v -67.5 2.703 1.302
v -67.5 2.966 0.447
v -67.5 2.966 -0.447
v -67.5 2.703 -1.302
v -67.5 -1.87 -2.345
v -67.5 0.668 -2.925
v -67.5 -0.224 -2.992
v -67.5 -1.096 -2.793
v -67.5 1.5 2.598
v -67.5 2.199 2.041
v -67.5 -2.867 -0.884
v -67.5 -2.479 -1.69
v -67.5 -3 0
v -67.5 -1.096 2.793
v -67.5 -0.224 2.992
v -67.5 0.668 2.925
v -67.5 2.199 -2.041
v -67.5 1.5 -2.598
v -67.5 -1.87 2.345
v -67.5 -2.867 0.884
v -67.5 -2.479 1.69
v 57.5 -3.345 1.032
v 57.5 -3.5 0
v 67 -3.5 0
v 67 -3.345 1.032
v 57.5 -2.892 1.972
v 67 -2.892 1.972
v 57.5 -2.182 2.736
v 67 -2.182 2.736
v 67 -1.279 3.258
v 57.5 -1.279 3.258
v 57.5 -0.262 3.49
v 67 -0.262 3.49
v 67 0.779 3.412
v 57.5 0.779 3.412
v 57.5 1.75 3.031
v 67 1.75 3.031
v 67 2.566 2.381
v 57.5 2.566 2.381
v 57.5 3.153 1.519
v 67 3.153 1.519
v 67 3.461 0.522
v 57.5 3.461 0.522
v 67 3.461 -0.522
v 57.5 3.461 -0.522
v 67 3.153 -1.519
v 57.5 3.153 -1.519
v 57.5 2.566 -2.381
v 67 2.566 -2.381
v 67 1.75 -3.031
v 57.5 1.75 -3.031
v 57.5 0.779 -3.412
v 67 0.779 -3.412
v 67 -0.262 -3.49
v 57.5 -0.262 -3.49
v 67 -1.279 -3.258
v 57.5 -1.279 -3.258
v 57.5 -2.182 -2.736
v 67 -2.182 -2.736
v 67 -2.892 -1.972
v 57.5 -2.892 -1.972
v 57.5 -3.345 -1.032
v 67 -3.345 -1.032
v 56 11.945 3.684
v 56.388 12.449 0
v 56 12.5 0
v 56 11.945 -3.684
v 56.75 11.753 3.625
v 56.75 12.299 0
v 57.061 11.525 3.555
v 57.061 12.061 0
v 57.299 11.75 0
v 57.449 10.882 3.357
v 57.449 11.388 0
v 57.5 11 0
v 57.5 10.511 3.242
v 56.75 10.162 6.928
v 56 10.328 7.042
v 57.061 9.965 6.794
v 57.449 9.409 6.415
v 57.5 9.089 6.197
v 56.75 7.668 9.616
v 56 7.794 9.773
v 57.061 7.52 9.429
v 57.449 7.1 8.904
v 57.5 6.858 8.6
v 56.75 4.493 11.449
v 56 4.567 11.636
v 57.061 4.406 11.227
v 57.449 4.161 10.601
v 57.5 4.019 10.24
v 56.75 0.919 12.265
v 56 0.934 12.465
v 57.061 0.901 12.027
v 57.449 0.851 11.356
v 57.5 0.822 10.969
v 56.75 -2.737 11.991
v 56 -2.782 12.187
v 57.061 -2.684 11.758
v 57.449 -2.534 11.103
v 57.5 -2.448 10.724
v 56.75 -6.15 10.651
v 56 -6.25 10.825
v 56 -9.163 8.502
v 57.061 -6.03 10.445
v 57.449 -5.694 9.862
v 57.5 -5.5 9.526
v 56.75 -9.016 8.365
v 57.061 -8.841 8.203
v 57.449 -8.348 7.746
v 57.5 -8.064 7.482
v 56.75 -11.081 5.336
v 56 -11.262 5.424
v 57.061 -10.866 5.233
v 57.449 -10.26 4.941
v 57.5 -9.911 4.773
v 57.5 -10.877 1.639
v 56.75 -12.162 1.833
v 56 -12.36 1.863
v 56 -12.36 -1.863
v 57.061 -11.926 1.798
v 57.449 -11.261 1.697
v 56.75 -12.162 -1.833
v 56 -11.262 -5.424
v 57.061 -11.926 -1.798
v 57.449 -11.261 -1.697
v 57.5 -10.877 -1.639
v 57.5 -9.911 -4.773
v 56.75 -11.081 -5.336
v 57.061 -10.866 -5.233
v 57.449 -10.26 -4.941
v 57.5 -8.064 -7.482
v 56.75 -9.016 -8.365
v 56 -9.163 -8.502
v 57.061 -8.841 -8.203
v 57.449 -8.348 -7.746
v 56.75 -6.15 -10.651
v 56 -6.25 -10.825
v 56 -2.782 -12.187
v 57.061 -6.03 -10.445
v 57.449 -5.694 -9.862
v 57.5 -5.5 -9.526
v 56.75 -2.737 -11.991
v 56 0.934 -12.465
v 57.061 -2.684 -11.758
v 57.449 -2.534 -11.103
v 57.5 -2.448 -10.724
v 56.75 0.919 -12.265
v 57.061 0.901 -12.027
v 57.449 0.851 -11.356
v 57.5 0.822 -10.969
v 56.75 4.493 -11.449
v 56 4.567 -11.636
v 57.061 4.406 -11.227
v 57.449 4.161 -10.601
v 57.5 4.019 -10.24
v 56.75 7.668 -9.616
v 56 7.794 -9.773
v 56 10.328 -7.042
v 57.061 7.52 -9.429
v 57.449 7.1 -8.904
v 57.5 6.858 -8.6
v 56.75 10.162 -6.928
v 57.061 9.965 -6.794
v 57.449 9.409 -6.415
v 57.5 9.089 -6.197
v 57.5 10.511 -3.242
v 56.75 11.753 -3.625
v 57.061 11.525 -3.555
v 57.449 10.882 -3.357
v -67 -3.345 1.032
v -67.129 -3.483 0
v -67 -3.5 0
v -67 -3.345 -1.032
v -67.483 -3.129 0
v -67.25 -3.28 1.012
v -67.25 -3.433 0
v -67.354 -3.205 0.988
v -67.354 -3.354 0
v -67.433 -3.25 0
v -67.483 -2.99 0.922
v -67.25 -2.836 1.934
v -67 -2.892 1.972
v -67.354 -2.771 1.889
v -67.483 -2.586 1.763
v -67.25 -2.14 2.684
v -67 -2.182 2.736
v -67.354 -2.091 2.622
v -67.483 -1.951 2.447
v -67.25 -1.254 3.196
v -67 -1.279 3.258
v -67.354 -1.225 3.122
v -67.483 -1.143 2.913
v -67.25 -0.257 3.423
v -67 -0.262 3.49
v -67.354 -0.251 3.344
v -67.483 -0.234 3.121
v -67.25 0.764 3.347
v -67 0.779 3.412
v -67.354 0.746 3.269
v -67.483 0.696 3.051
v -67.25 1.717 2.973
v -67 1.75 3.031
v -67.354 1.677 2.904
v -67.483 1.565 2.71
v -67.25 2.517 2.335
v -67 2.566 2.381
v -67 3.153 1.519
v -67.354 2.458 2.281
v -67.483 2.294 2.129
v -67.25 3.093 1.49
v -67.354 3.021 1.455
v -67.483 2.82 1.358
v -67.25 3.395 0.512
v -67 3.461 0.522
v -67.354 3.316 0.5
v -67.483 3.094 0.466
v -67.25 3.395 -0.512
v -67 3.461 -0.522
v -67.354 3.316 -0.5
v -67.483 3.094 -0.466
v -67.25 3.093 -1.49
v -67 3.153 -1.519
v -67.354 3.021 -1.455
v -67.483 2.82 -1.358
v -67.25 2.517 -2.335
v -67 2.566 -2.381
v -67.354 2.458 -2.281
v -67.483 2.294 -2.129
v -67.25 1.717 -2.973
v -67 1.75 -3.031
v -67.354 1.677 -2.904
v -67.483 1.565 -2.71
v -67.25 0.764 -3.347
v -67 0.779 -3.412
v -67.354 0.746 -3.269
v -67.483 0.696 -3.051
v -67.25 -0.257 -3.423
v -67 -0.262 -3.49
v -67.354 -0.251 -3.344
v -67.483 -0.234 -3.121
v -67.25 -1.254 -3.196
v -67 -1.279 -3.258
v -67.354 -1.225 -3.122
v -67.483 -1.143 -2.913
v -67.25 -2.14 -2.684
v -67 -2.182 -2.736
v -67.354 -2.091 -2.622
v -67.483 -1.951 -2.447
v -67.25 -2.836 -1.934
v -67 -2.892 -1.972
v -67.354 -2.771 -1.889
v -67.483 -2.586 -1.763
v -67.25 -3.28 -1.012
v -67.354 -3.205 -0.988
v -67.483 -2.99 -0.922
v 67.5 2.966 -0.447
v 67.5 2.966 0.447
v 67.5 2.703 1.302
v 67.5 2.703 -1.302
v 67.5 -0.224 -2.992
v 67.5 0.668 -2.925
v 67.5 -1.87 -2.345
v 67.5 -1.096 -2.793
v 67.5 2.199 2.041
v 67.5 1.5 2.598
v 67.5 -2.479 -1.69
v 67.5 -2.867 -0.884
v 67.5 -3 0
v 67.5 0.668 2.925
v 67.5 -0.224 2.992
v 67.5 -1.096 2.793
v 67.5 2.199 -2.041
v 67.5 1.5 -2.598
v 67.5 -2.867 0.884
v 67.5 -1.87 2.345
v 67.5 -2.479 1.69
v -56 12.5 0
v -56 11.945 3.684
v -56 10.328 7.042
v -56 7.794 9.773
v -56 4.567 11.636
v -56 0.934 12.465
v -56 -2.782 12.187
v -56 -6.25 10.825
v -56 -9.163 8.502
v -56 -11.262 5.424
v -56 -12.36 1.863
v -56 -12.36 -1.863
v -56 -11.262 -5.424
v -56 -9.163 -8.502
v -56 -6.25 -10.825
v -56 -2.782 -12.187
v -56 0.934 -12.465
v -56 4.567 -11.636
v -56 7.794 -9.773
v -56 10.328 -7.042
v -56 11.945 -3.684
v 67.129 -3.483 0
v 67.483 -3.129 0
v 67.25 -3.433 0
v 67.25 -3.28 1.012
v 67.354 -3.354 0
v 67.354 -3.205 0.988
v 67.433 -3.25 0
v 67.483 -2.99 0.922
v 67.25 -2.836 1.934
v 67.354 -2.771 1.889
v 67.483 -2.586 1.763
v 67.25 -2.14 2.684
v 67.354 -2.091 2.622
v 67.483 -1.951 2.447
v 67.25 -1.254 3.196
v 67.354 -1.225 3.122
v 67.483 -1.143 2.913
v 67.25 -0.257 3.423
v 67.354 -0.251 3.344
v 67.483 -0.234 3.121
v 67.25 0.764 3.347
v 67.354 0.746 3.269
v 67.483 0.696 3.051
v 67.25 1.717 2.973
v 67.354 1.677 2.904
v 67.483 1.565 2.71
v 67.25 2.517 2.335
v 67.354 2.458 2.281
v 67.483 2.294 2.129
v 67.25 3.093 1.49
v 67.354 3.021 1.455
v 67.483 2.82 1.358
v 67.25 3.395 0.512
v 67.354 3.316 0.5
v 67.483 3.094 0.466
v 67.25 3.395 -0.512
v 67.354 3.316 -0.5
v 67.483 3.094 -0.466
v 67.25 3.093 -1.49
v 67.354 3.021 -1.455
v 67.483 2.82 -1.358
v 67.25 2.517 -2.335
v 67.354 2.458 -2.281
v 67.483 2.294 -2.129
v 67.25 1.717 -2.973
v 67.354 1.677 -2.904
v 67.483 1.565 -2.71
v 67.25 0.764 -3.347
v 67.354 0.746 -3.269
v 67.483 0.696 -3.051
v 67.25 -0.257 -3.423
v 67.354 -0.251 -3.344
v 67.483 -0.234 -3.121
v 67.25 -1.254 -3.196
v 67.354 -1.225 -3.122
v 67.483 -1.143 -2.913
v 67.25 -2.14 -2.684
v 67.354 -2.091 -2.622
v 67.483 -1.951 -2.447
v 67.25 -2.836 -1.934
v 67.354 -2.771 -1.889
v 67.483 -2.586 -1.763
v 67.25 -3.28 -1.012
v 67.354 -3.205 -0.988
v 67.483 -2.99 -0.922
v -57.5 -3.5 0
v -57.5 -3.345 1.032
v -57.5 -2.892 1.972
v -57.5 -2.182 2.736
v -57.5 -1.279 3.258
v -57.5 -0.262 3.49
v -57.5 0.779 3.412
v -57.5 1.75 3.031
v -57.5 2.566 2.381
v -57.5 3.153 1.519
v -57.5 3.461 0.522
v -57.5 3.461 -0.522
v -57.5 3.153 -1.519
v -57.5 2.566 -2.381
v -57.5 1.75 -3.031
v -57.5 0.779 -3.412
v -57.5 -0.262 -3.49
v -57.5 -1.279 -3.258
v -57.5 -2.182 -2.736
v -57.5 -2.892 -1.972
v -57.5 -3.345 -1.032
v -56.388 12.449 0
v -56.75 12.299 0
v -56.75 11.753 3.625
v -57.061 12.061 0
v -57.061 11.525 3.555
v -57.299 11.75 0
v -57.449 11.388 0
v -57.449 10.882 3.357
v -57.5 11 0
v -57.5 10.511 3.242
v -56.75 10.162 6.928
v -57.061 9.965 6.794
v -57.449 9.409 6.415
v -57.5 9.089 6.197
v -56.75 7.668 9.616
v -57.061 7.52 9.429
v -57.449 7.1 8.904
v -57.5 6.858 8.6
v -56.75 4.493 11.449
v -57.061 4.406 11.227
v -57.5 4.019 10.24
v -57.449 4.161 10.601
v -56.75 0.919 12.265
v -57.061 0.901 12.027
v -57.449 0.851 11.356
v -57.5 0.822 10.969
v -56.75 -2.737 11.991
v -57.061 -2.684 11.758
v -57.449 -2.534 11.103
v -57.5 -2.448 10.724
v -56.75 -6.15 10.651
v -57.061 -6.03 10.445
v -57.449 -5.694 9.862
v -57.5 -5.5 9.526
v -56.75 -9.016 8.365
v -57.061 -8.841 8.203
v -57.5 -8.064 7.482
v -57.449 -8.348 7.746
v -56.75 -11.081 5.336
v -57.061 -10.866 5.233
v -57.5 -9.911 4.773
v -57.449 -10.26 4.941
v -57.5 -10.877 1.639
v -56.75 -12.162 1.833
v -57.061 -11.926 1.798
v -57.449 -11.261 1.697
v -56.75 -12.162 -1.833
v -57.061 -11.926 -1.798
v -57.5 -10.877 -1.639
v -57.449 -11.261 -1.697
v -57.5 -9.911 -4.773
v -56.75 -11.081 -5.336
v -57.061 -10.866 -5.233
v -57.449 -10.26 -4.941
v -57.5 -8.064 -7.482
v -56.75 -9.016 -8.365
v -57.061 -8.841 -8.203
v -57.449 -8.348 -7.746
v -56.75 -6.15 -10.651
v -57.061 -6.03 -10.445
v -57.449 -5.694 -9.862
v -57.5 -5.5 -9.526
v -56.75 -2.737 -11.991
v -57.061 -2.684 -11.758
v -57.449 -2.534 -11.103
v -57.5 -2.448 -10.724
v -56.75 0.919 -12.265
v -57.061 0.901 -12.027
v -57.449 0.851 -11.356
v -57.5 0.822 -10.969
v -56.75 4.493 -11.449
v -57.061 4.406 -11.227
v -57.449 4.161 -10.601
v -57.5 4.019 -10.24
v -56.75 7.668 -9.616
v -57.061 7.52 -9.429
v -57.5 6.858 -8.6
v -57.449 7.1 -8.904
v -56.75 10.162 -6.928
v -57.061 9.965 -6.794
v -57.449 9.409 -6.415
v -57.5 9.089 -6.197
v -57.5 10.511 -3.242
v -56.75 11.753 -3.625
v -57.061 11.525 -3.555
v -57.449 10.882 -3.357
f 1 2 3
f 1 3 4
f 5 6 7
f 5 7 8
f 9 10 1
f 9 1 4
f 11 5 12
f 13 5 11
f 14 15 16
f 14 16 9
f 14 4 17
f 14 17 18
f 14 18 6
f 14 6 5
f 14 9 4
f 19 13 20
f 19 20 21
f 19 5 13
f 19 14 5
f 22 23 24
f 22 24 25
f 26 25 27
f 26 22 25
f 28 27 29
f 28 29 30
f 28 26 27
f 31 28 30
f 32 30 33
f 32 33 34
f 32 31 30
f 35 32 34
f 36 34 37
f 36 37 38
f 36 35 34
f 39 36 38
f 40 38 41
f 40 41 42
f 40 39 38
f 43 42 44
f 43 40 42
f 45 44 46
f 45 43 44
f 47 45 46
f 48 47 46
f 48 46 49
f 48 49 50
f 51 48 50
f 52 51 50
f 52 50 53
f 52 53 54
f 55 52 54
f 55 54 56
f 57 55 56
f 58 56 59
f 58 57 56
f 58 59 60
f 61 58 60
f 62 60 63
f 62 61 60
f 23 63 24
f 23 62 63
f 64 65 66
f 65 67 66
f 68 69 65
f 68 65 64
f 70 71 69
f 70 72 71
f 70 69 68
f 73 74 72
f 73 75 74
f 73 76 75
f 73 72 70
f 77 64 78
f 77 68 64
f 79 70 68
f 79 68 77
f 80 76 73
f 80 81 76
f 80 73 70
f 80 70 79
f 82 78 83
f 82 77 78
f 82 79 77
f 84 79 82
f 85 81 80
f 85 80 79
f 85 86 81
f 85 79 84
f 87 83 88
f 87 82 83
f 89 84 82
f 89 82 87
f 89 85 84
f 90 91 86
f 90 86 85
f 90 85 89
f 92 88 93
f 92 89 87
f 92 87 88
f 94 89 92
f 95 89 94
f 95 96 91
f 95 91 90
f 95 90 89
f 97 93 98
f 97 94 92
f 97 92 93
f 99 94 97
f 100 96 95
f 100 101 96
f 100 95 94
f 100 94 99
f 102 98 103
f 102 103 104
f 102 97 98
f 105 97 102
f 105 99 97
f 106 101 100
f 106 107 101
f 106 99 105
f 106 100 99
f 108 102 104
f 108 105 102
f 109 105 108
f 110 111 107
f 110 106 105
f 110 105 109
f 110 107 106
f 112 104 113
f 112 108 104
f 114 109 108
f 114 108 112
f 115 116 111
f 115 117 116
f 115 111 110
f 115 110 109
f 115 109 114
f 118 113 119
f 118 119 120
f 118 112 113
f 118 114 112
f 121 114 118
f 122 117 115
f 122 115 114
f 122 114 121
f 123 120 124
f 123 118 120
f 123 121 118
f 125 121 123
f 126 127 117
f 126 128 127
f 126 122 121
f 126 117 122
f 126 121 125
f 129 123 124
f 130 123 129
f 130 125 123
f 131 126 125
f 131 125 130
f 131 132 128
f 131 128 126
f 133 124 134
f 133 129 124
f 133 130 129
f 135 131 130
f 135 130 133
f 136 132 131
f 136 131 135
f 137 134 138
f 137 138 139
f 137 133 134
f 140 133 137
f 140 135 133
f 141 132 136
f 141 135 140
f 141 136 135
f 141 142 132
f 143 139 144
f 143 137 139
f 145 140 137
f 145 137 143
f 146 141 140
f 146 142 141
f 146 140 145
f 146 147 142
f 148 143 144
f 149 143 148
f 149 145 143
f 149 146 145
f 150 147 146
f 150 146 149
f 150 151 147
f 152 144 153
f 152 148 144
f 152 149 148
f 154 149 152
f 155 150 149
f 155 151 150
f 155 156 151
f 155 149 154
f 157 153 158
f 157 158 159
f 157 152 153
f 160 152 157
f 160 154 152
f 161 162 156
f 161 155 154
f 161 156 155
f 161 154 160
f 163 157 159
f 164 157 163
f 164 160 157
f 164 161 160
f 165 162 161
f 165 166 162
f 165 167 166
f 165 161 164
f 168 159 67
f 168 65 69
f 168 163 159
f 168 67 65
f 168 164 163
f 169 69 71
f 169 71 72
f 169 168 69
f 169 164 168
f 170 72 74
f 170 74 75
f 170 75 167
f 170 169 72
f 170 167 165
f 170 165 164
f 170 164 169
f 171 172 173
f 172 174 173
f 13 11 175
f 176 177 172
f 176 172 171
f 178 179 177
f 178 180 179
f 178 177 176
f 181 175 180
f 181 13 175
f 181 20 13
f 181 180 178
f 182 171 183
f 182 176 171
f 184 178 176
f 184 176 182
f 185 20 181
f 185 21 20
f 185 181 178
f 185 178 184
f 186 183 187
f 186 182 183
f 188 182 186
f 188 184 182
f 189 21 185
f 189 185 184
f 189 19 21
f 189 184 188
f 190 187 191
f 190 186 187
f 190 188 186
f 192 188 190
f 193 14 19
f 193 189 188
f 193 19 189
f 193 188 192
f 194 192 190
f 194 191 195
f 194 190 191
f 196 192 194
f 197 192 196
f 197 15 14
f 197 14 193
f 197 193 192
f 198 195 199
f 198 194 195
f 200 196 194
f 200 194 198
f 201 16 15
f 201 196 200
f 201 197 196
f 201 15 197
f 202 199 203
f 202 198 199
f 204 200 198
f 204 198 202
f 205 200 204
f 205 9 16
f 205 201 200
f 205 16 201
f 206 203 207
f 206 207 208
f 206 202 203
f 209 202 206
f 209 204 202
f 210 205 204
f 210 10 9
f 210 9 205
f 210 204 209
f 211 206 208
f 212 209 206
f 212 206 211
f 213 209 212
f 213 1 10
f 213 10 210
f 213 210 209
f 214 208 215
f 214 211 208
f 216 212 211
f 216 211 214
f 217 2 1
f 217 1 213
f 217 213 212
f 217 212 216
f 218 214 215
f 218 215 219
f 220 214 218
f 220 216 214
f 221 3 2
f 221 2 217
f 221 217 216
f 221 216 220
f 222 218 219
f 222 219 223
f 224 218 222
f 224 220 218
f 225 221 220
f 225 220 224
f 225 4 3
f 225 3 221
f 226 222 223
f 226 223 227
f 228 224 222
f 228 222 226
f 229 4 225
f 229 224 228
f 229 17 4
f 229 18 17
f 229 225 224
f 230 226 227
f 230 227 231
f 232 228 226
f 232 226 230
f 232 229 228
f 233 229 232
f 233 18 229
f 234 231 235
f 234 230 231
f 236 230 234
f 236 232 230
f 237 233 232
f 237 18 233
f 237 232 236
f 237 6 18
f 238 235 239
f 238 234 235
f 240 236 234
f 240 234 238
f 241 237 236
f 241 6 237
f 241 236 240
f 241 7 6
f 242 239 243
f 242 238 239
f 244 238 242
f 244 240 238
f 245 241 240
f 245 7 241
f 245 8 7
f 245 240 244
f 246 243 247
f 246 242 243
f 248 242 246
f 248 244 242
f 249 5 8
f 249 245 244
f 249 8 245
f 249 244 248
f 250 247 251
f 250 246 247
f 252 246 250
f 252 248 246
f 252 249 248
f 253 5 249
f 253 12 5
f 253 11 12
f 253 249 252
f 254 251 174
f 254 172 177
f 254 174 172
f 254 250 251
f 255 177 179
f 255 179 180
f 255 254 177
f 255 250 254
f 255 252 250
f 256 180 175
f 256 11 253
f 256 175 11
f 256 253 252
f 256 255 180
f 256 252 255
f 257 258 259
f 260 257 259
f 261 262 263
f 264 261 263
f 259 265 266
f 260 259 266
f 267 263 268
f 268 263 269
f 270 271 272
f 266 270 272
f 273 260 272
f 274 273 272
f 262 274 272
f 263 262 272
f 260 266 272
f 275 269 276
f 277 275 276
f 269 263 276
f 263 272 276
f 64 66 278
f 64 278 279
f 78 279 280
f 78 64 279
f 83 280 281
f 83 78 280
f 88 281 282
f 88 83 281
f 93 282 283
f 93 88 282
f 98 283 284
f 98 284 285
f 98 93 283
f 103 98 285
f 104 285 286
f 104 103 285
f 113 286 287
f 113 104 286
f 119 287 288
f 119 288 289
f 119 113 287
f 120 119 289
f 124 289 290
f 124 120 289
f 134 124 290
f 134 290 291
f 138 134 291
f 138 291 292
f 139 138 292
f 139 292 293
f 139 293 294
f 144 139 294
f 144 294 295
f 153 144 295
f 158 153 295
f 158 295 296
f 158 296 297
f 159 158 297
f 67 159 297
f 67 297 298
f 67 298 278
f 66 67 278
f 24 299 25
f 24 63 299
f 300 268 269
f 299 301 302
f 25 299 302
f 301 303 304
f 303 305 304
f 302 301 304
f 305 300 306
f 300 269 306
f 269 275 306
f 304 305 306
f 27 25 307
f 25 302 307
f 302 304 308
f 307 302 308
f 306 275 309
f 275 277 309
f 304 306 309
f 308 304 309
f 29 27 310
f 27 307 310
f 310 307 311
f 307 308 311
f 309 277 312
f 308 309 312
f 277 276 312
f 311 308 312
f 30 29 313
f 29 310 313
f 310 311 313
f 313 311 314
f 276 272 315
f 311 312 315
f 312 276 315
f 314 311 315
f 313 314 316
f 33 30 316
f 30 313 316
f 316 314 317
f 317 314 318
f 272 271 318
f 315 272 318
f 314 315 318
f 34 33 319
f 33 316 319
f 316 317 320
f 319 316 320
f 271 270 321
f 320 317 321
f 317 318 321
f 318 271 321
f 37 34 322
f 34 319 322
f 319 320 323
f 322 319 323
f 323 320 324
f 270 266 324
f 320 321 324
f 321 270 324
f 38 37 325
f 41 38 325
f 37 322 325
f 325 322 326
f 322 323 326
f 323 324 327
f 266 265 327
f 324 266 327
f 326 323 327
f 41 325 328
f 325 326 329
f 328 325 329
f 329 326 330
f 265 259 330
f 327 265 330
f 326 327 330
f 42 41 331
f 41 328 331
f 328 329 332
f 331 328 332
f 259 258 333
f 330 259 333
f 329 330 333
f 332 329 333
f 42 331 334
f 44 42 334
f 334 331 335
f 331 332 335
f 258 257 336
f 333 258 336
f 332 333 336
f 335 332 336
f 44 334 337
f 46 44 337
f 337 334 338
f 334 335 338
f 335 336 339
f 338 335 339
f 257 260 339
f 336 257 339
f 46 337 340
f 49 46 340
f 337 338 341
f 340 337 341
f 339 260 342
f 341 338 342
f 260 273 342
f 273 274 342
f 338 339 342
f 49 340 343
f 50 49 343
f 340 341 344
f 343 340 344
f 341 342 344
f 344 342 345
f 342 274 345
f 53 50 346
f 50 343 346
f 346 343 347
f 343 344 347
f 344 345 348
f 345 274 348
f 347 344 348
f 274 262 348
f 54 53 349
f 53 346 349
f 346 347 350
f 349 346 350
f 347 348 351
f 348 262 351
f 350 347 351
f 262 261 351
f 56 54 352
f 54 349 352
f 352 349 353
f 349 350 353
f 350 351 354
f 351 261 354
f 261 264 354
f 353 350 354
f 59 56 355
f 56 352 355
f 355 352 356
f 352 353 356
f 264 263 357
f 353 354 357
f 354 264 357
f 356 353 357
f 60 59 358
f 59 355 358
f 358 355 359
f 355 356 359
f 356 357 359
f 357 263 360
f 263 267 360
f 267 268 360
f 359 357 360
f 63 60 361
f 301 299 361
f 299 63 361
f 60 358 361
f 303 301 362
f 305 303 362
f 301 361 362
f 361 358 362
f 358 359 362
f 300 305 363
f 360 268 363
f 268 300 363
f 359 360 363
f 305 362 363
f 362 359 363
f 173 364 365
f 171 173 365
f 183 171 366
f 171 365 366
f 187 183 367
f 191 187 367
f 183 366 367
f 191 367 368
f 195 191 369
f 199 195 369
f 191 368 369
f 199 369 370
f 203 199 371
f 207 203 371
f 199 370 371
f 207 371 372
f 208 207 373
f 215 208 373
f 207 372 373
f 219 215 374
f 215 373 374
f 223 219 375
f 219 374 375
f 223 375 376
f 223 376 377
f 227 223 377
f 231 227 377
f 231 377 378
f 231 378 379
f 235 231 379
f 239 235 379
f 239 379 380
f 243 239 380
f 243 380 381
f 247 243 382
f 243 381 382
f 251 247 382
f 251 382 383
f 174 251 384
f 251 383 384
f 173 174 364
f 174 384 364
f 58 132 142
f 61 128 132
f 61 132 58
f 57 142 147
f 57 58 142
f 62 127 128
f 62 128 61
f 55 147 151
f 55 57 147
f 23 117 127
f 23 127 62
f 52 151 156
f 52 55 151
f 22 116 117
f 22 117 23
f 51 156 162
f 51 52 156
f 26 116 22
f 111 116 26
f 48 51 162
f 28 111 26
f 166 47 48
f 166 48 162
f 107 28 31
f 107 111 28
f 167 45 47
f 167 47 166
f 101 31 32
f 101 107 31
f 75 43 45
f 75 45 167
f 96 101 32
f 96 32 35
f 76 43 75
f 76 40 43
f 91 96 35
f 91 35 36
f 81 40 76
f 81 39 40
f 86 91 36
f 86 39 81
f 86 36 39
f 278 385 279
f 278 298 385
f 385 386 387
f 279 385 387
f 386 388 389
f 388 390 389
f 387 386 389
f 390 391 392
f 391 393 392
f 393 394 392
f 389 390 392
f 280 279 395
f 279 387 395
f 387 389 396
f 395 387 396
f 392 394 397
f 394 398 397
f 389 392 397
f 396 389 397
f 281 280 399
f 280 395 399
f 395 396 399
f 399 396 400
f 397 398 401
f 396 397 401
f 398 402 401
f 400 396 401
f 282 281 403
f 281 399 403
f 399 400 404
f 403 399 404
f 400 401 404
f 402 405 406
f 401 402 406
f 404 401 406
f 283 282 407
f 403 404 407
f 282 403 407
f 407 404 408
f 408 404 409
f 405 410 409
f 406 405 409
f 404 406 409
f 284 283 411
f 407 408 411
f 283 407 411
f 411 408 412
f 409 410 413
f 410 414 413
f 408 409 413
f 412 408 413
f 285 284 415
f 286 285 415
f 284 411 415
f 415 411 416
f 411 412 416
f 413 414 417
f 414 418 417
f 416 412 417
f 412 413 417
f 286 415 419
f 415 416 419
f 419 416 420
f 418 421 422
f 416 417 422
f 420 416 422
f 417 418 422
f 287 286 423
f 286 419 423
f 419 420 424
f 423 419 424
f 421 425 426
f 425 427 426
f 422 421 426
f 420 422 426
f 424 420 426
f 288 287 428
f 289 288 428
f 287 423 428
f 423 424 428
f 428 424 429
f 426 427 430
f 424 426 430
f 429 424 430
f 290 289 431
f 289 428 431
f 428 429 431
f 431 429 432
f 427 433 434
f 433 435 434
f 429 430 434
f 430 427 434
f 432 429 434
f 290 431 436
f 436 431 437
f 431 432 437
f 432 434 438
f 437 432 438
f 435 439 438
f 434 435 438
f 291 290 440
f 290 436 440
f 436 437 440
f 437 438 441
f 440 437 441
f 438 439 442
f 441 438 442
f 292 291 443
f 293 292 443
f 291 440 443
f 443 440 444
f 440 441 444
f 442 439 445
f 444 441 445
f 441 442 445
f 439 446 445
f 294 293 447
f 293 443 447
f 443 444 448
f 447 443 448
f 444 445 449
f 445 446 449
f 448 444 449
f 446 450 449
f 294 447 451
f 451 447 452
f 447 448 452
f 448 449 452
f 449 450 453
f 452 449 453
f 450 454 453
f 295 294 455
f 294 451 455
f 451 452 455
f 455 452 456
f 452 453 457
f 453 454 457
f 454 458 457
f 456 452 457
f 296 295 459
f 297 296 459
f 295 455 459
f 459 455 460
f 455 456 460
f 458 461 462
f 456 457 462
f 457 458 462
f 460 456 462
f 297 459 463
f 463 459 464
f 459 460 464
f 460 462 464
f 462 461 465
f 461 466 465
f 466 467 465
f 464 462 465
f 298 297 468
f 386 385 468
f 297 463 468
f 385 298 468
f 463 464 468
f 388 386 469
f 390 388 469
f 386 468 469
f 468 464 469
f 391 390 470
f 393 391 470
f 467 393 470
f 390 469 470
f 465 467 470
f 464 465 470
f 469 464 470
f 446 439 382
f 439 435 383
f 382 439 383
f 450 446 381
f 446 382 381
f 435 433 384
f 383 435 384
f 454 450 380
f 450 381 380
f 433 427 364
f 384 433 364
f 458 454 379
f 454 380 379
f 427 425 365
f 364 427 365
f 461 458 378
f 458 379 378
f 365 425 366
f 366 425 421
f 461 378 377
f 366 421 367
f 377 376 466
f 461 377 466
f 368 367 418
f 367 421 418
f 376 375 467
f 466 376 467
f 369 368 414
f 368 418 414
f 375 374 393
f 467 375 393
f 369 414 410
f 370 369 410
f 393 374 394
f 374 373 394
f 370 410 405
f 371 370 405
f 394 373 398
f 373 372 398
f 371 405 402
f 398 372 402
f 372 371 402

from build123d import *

# Parameters (mm, degrees)
F0_R     = 12.5
F1_DEPTH = 57.5
F2_R     = 3.5
F3_DEPTH = 10
F5_R     = 1.5
F6_R     = 0.5


with BuildPart() as f1:
    # F0 (on Right) → F1 (new body, symmetric)
    with BuildSketch(Plane.YZ):
        Circle(F0_R)
    extrude(amount=F1_DEPTH, both=True)

    # F2 (on face) → F3 (join)
    with BuildSketch(Plane(origin=(-57.5, 0, 0), x_dir=(0, -1, 0), z_dir=(-1, 0, 0))):
        Circle(F2_R)
    extrude(amount=F3_DEPTH)

    # F4: F1 across plane


with BuildPart() as f1_1:
    add(f1.part)
    add(f1.part.mirror(Plane.YZ))

    # F5
    f5_edges = [f1_1.edges().sort_by_distance(p)[0] for p in [
        (-57.5, -12.5, 0),
        (57.5, -12.5, 0),
    ]]
    fillet(f5_edges, radius=F5_R)

    # F6
    f6_edges = [f1_1.edges().sort_by_distance(p)[0] for p in [
        (67.5, 3.5, 0),
        (-67.5, 3.5, 0),
    ]]
    fillet(f6_edges, radius=F6_R)


solid = f1_1.part
